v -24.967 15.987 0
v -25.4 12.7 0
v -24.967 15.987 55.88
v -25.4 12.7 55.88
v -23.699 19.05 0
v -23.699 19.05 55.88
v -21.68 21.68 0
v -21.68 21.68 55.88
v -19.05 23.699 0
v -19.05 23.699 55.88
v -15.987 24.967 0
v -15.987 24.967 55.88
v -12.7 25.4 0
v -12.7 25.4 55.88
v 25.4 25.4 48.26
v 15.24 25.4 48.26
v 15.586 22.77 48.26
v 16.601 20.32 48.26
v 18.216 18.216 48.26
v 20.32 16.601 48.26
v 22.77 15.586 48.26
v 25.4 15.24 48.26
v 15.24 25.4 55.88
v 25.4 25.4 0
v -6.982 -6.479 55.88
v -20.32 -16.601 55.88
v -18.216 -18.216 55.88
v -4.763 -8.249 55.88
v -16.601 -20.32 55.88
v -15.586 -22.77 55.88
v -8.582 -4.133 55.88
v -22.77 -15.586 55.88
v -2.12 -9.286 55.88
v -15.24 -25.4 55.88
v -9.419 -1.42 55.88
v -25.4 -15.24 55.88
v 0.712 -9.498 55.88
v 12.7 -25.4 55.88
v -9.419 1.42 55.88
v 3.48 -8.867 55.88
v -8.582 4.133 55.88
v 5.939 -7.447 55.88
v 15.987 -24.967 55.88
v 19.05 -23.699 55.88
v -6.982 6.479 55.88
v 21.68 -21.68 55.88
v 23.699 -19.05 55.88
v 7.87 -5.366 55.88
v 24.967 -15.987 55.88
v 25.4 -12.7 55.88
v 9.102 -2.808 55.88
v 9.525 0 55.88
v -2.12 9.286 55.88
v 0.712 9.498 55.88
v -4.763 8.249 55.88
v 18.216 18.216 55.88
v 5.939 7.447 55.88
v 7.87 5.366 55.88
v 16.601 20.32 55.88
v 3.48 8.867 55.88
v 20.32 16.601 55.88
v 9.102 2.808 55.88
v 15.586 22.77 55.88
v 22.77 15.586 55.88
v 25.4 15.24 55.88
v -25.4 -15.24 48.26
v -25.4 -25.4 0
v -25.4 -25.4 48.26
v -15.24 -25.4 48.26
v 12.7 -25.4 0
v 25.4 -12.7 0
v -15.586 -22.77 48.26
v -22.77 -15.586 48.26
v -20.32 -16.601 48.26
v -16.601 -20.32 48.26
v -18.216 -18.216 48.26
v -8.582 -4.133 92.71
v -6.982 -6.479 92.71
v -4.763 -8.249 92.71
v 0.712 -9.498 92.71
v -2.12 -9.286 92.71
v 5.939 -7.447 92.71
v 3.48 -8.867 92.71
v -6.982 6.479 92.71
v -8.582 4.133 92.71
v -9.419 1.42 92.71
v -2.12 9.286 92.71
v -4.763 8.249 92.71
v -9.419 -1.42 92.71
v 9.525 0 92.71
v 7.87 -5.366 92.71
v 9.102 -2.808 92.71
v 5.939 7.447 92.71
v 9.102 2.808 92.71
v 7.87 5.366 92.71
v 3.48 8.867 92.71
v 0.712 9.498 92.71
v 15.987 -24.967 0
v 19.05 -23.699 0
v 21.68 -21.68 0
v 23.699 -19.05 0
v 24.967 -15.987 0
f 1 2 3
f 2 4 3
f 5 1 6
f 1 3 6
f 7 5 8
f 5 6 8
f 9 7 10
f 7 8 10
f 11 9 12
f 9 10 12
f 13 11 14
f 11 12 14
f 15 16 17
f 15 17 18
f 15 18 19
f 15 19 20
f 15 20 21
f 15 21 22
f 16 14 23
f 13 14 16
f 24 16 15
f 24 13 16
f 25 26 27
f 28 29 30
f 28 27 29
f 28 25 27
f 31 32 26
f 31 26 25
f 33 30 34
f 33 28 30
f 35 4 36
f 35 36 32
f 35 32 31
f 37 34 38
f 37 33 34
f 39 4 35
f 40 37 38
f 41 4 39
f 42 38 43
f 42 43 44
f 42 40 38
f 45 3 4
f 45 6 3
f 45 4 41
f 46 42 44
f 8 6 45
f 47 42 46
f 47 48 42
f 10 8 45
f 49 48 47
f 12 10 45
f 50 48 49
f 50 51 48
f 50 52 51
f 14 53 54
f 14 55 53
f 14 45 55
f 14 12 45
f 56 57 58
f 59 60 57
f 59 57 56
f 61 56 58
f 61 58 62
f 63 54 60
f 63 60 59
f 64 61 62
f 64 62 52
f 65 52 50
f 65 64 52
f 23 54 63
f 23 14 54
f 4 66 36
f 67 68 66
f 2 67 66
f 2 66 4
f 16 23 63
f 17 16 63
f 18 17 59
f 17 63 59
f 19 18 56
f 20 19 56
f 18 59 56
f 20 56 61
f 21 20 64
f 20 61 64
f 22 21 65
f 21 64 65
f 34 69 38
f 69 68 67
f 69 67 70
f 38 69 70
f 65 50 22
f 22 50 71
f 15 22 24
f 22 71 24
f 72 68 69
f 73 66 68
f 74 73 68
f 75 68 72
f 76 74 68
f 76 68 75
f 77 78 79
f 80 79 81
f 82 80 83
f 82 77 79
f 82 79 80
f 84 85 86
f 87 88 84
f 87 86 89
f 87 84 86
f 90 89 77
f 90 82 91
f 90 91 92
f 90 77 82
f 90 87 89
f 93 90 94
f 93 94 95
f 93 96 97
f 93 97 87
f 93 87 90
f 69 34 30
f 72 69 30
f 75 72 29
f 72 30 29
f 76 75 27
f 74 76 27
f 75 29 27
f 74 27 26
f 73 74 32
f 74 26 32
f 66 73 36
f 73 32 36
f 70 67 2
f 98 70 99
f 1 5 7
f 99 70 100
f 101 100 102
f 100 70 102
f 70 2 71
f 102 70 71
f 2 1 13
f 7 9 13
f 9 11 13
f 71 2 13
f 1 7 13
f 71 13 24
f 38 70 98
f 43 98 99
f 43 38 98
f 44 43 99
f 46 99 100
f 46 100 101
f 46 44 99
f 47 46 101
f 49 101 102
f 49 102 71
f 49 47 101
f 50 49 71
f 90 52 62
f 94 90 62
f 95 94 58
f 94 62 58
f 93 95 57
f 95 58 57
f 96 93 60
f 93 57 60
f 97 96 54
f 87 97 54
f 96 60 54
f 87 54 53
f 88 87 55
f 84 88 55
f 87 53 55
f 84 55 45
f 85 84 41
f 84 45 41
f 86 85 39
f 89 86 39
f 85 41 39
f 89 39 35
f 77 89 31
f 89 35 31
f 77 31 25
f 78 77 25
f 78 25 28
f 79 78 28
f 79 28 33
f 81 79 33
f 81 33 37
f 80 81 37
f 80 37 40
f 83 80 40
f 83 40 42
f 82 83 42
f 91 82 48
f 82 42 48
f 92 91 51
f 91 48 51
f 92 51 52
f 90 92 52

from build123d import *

# Parameters (mm, degrees)
F0_W     = 50.8
F0_H     = 50.8
F1_DEPTH = 55.88
F2_R     = 12.7
F4_DEPTH = 7.62
F5_R     = 9.525
F6_DEPTH = 36.83


with BuildPart() as f1:
    # F0 (on Top) → F1 (new body)
    with BuildSketch(Plane.XY):
        Rectangle(F0_W, F0_H)
    extrude(amount=F1_DEPTH)

    # F2
    f2_edges = [f1.edges().sort_by_distance(p)[0] for p in [
        (-25.4, 25.4, 27.94),
        (25.4, -25.4, 27.94),
    ]]
    fillet(f2_edges, radius=F2_R)

    # F3 (on face) → F4 (cut)
    with BuildSketch(Plane.XY.offset(55.88)):
        with BuildLine():
            Line((25.4, 25.4), (15.24, 25.4))
            ThreePointArc((15.24, 25.4), (18.215795, 18.215795), (25.4, 15.24))
            Line((25.4, 15.24), (25.4, 25.4))
        make_face()
        with BuildLine():
            ThreePointArc((-15.24, -25.4), (-18.215795, -18.215795), (-25.4, -15.24))
            Line((-25.4, -15.24), (-25.4, -25.4))
            Line((-25.4, -25.4), (-15.24, -25.4))
        make_face()
    extrude(amount=-F4_DEPTH, mode=Mode.SUBTRACT)

    # F5 (on face) → F6 (join)
    with BuildSketch(Plane.XY.offset(55.88)):
        Circle(F5_R)
    extrude(amount=F6_DEPTH)


solid = f1.part
